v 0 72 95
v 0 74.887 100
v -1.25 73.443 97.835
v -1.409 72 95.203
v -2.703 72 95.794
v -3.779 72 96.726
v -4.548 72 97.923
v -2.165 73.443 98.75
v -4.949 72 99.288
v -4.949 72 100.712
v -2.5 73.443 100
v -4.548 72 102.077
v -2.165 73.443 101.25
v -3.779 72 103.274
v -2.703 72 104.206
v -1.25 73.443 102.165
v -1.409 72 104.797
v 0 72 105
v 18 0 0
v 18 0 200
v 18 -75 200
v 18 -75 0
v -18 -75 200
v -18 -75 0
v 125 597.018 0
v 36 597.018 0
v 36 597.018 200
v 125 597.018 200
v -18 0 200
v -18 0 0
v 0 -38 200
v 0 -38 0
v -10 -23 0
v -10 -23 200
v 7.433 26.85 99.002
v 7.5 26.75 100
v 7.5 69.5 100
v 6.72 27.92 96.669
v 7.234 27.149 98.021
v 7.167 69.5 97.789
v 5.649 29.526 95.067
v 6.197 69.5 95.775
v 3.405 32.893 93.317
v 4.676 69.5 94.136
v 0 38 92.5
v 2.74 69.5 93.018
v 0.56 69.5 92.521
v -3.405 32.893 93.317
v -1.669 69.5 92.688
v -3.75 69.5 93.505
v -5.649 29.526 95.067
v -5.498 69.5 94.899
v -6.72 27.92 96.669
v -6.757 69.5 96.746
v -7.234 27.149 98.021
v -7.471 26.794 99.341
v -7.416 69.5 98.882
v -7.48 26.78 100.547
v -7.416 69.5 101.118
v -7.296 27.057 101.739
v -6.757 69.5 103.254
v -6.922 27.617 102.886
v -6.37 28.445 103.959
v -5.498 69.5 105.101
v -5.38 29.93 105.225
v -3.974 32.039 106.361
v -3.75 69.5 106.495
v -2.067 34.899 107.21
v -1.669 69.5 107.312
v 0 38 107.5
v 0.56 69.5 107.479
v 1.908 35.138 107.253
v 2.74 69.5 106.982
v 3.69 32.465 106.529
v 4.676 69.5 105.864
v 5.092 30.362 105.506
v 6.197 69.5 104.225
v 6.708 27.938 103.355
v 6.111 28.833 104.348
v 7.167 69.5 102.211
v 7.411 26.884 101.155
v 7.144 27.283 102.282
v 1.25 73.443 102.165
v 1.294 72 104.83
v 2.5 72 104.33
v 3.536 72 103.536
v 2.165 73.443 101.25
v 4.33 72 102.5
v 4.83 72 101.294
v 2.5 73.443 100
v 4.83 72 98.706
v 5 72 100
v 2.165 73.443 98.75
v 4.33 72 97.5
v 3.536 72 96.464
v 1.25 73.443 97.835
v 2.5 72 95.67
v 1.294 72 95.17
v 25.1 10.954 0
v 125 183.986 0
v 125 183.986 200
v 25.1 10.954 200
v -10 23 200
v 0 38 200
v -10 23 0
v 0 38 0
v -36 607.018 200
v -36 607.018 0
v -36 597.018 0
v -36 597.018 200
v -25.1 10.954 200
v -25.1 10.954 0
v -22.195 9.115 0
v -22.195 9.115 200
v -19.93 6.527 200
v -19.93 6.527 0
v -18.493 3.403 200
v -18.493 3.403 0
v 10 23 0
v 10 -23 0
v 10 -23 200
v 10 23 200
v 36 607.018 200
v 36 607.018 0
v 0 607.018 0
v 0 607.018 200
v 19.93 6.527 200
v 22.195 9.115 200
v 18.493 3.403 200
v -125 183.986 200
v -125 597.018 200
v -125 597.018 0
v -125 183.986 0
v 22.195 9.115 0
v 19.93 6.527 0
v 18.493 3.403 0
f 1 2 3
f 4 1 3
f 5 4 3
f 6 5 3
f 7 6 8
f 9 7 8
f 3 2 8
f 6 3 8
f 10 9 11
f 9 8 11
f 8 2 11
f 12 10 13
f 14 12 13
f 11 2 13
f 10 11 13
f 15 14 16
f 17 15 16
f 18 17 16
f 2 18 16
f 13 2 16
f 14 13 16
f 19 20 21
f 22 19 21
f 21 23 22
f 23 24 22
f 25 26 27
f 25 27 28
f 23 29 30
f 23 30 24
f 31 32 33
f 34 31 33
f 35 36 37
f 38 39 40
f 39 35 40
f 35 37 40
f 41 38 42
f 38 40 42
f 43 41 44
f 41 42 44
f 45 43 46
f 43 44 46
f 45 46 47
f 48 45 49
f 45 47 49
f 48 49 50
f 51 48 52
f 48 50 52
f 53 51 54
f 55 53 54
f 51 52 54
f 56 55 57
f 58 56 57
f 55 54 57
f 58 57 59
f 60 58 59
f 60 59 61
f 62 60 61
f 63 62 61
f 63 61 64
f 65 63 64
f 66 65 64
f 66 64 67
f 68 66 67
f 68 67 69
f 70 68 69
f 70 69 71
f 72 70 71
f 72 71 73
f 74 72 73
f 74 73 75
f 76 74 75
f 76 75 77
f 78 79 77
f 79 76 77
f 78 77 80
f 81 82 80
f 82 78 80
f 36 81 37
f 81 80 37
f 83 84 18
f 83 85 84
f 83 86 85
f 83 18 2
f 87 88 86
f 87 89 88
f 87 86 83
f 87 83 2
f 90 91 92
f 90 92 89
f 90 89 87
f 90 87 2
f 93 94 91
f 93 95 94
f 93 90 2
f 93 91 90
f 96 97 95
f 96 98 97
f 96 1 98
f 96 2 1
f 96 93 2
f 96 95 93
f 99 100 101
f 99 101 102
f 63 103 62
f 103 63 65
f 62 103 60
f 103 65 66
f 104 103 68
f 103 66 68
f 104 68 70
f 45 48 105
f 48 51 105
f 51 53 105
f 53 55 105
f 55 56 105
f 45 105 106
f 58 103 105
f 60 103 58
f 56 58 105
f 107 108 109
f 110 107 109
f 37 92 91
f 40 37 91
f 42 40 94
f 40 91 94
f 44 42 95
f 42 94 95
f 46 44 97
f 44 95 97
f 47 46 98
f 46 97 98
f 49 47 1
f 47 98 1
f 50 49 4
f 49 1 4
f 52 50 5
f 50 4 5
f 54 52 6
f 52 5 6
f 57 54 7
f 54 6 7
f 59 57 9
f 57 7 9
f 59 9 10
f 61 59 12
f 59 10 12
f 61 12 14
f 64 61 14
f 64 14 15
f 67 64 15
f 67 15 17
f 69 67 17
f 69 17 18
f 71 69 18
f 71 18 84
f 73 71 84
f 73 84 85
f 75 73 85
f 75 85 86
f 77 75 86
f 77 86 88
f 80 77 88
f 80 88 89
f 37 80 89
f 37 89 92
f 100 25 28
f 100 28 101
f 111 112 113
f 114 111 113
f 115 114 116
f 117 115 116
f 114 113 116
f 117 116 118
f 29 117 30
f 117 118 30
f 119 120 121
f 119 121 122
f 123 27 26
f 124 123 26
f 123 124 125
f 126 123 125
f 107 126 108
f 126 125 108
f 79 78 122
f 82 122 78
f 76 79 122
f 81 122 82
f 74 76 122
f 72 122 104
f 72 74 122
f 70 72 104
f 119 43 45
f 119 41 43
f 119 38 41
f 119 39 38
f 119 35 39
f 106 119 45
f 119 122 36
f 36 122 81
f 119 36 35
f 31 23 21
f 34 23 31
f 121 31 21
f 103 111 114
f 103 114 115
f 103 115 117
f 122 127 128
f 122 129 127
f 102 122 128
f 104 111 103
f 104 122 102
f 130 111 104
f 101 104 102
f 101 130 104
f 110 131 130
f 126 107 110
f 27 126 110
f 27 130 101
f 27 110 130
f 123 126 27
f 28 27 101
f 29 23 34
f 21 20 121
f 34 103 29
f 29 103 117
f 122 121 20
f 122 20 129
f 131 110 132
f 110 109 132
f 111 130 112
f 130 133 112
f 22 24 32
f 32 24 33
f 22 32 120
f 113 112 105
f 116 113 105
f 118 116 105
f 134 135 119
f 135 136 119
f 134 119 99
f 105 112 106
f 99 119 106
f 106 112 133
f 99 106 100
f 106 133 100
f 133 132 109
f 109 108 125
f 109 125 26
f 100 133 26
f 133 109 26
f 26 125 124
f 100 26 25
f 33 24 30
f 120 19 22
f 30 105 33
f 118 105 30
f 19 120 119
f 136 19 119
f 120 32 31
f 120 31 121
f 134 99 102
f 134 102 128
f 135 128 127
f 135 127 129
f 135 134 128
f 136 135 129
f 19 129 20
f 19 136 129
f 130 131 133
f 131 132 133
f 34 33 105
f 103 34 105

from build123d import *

# Parameters (mm, degrees)
AUFSATZ_LINEAR_AUSTRAGEN1_DEPTH = 200
AUFSATZ_LINEAR_AUSTRAGEN2_DEPTH = 10
SPIEGELN2_DEPTH                 = 96.337442911
SPIEGELN2_START                 = 104.471237307
SPIEGELN2_2_DEPTH               = 95.528762693
SPIEGELN2_START_2               = 96.337442911
SPIEGELN2_3_DEPTH               = 8.133794396


with BuildPart() as part:
    # Skizze1 → Aufsatz-Linear austragen1 (new body)
    with BuildSketch(Plane.XY):
        with BuildLine():
            Line((0, 38), (-1.4223e-13, 597.0183631567951))
            Line((-1.4223e-13, 597.0183631567951), (125, 597.0183631567951))
            Line((125, 597.0183631567951), (125, 183.98587038126252))
            Line((125, 183.98587038126252), (25.100000000000005, 10.953994705129267))
            ThreePointArc((25.100000000000005, 10.953994705129267), (19.930243299860727, 6.526867548832285), (18.000000000000007, -3.47e-15))
            Line((18.000000000000007, -3.47e-15), (18.000000000000007, -75))
            Line((18.000000000000007, -75), (0, -75))
            Line((0, -75), (0, -38.000000000000014))
            Line((0, -38.000000000000014), (10.000000000000002, -23.000000000000014))
            Line((10.000000000000002, -23.000000000000014), (10.000000000000007, -1.388e-14))
            Line((10.000000000000007, -1.388e-14), (10.000000000000002, 22.999999999999986))
            Line((10.000000000000002, 22.999999999999986), (0, 38))
        make_face()
    extrude(amount=AUFSATZ_LINEAR_AUSTRAGEN1_DEPTH)

    # Skizze2 → Aufsatz-Linear austragen2 (add)
    with BuildSketch(Plane(origin=(0, 597.0183631567951, 0), x_dir=(1, 0, 0), z_dir=(0, 1, 0))):
        Polygon((-1.4223e-13, -200), (35.99999999999986, -200), (35.999999999999865, 0), (1.225e-14, 0), align=None)
    extrude(amount=AUFSATZ_LINEAR_AUSTRAGEN2_DEPTH)

    # Skizze3 → Schnitt-Rotation1 (revolve, cut)
    with BuildSketch(Plane(origin=(0, 0, 0), x_dir=(0, 0, -1), z_dir=(1, 0, 0))):
        Polygon((-105.00000000000001, 72.00000000000001), (-107.50000000000001, 69.5), (-107.50000000000001, 0), (-100, 0), (-100, 72.00000000000001), (-100, 74.88675134594817), align=None)
    revolve(axis=Axis((0, 0, 100), (0, 1, 0)), mode=Mode.SUBTRACT)

    # Spiegeln2: read off the stored shape, not the designer's step
    # Spiegeln2 outline → Spiegeln2 (add)
    with BuildSketch(Plane.XY):
        with BuildLine():
            Line((-36, 607.018363157), (-36, 597.018363157))
            Line((-36, 597.018363157), (-125, 597.018363157))
            Line((-125, 597.018363157), (-125, 183.985870381))
            Line((-125, 183.985870381), (-25.1, 10.953994705))
            ThreePointArc((-25.1, 10.953994705), (-19.9302433, 6.526867549), (-18, 0))
            Line((-18, 0), (-18, -75))
            Line((-18, -75), (0, -75))
            Line((0, -75), (0, -38))
            Line((0, -38), (-10, -23))
            Line((-10, -23), (-10, 23))
            Line((-10, 23), (0, 38))
            Line((0, 38), (0, 607.018363157))
            Line((0, 607.018363157), (-36, 607.018363157))
        make_face()
    extrude(amount=SPIEGELN2_DEPTH)

    # Spiegeln2 2 outline → Spiegeln2 2 (add)
    with BuildSketch(Plane.XY.offset(SPIEGELN2_START)):
        with BuildLine():
            Line((-36, 607.018363157), (-36, 597.018363157))
            Line((-36, 597.018363157), (-125, 597.018363157))
            Line((-125, 597.018363157), (-125, 183.985870381))
            Line((-125, 183.985870381), (-25.1, 10.953994705))
            ThreePointArc((-25.1, 10.953994705), (-19.9302433, 6.526867549), (-18, 0))
            Line((-18, 0), (-18, -75))
            Line((-18, -75), (0, -75))
            Line((0, -75), (0, -38))
            Line((0, -38), (-10, -23))
            Line((-10, -23), (-10, 23))
            Line((-10, 23), (0, 38))
            Line((0, 38), (0, 607.018363157))
            Line((0, 607.018363157), (-36, 607.018363157))
        make_face()
    extrude(amount=SPIEGELN2_2_DEPTH)

    # Spiegeln2 3 outline → Spiegeln2 3 (add)
    with BuildSketch(Plane.XY.offset(SPIEGELN2_START_2)):
        with BuildLine():
            Line((-36, 607.018363157), (-36, 597.018363157))
            Line((-36, 597.018363157), (-125, 597.018363157))
            Line((-125, 597.018363157), (-125, 183.985870381))
            Line((-125, 183.985870381), (-25.1, 10.953994705))
            ThreePointArc((-25.1, 10.953994705), (-19.9302433, 6.526867549), (-18, 0))
            Line((-18, 0), (-18, -75))
            Line((-18, -75), (0, -75))
            Line((0, -75), (0, -38))
            Line((0, -38), (-10, -23))
            Line((-10, -23), (-10, 23))
            Line((-10, 23), (0, 38))
            Line((0, 38), (0, 607.018363157))
            Line((0, 607.018363157), (-36, 607.018363157))
        make_face()
    extrude(amount=SPIEGELN2_3_DEPTH)

    # Spiegeln2 4 outline → Spiegeln2 4 (revolve, cut)
    with BuildSketch(Plane.XY.offset(100)):
        Polygon((5, 72), (0, 74.886751346), (0, 26.711700462), (7.5, 26.711700462), (7.5, 69.5), align=None)
    revolve(axis=Axis((0, 0, 100), (0, 1, 0)), mode=Mode.SUBTRACT)


solid = part.part
